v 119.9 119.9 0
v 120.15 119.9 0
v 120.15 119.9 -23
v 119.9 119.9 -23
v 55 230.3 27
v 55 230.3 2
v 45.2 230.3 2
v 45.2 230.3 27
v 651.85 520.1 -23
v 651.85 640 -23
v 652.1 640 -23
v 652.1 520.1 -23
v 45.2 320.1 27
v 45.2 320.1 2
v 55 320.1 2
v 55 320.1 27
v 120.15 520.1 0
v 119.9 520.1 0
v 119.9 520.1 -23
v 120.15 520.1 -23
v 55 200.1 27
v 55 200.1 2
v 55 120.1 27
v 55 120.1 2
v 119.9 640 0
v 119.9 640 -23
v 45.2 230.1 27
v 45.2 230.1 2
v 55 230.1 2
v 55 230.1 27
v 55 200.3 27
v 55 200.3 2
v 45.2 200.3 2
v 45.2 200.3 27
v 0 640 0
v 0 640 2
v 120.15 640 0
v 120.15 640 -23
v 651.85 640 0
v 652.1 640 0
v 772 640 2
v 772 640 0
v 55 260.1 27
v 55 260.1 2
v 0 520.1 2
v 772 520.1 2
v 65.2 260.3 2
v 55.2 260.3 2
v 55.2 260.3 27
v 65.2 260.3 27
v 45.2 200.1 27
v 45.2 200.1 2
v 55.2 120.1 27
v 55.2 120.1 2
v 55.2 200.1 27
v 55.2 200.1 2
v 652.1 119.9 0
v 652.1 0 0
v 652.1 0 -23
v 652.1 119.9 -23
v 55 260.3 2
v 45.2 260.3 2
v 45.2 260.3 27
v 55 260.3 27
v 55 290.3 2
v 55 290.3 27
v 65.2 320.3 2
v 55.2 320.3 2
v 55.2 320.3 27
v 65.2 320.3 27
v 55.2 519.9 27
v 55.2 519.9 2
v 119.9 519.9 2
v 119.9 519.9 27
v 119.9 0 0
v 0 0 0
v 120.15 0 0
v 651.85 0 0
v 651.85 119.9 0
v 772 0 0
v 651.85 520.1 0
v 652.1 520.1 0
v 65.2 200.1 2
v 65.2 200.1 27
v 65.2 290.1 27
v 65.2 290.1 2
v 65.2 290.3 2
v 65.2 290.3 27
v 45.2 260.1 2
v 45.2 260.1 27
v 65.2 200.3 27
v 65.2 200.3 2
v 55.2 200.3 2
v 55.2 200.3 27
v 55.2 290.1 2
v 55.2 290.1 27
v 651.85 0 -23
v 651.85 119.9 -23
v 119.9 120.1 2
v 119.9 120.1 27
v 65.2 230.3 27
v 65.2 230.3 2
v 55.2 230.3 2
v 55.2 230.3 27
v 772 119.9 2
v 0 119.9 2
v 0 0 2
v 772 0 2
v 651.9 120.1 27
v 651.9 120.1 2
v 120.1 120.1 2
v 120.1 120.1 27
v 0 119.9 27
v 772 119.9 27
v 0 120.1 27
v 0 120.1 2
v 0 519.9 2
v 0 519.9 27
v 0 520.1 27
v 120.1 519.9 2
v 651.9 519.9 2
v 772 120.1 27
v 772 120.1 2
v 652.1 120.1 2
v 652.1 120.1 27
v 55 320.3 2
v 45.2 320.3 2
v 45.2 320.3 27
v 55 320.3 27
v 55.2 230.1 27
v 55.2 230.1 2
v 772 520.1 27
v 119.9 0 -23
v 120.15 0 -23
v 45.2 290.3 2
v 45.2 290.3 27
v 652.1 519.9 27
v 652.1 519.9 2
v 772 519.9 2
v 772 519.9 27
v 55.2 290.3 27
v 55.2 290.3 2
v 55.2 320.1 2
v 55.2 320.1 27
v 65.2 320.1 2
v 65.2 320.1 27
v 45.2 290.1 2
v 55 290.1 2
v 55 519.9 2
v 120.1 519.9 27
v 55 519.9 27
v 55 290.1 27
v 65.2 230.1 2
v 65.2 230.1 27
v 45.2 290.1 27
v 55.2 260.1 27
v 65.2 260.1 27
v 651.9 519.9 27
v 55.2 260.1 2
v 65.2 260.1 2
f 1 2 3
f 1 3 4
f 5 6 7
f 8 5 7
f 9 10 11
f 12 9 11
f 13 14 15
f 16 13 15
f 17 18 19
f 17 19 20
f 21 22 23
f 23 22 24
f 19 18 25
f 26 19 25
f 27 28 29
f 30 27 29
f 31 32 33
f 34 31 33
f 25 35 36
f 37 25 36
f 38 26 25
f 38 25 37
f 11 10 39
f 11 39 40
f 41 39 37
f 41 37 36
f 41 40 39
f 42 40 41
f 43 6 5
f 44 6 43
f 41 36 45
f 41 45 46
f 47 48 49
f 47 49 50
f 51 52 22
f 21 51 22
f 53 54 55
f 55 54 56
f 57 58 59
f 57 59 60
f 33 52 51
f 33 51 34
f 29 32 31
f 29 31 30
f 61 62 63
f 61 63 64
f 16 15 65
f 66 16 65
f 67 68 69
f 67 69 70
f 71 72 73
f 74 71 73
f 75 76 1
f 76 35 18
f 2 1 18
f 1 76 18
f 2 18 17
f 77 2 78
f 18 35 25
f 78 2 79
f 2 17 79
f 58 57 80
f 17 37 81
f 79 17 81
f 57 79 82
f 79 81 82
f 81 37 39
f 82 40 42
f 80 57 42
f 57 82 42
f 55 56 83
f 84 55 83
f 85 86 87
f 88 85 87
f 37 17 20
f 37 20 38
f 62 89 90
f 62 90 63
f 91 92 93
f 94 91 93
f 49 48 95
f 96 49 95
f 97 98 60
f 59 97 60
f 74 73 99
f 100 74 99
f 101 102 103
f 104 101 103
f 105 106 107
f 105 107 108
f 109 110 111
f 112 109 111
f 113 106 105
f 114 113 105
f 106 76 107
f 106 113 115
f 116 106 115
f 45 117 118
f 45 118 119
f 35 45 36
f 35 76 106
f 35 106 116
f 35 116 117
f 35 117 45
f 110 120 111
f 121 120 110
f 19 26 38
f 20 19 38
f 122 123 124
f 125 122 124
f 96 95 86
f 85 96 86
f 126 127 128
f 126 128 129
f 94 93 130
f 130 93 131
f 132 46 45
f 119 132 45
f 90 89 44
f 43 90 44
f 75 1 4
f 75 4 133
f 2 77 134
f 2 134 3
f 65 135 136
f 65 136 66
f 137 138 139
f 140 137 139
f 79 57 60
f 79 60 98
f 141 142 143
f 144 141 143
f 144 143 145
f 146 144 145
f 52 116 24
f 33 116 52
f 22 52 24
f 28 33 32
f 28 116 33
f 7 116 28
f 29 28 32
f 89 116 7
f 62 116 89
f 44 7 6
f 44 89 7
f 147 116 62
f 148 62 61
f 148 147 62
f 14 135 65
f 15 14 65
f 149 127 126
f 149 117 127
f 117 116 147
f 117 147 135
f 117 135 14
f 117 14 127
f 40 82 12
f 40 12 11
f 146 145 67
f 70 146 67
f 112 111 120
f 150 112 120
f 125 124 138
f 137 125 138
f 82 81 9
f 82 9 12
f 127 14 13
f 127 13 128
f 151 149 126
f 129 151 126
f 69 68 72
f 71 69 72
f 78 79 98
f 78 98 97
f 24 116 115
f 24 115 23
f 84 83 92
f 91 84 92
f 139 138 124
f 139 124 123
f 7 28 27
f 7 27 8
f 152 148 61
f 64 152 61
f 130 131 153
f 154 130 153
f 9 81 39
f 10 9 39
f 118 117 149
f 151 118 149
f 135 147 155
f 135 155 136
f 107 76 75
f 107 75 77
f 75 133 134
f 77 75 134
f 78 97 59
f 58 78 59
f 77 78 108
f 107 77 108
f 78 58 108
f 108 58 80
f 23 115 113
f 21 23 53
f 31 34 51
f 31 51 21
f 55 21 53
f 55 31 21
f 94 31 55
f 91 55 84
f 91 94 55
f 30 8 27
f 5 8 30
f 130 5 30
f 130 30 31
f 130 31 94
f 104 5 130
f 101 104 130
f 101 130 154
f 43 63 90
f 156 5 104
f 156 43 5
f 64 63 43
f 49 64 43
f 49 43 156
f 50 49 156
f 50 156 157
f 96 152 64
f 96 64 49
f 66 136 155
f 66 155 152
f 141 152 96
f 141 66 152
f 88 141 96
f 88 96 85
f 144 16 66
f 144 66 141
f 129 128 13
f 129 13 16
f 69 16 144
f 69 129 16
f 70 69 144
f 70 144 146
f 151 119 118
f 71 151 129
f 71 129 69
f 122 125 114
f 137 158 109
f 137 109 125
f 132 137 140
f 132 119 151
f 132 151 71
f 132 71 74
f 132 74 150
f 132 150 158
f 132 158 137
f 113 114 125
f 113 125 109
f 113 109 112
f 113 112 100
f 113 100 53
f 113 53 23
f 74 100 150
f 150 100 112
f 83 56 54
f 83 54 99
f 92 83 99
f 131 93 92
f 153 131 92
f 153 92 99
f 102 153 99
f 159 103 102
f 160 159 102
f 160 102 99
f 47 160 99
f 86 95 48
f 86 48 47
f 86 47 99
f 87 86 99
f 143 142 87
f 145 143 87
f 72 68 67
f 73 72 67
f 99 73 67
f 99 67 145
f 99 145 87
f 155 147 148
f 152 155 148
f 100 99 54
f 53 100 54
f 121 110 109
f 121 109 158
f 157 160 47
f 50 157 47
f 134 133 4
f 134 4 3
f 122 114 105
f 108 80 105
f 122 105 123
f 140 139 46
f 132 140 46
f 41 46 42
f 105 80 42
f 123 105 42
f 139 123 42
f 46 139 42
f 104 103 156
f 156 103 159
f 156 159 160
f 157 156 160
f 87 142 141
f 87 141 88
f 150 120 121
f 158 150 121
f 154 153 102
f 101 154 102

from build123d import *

# Parameters (mm, degrees)
F0_W     = 772
F0_H     = 640
F1_DEPTH = 2
F2_W     = 0.25
F2_H     = 119.9
F3_DEPTH = 25
F4_DEPTH = 25
F2_W_2   = 119.9
F2_H_2   = 0.2
F2_W_3   = 0.2
F2_H_3   = 399.8
F5_DEPTH = 25
F2_W_4   = 64.7
F6_DEPTH = 25
F2_W_5   = 55
F7_DEPTH = 25
F2_H_4   = 49.5626640439
F8_DEPTH = 25
F2_H_5   = 199.6
F2_W_6   = 9.8
F2_H_6   = 30.4373359561
F2_W_7   = 10
F2_H_7   = 29.8
F9_DEPTH = 25


# Not quite as in the source:
# - a feature names something its author has since deleted; it is built from what else it names


with BuildPart() as f1:
    # F0 (on Top) → F1 (new body)
    with BuildSketch(Plane.XY):
        with Locations((386, 320)):
            Rectangle(F0_W, F0_H)
    extrude(amount=F1_DEPTH)

    # F2 (on face) → F3 (join)
    with BuildSketch(Plane.XY.offset(2)):
        with Locations((651.975, 580.05)):
            Rectangle(F2_W, F2_H)
        with Locations((120.025, 580.05)):
            Rectangle(F2_W, F2_H)
        Polygon((120.1, 119.9), (119.9, 119.9), (119.9, 0), (120.15, 0), (120.15, 119.9), align=None)
        Polygon((652.1, 119.9), (651.9, 119.9), (651.85, 119.9), (651.85, 0), (652.1, 0), align=None)
    extrude(amount=-F3_DEPTH)

    # F2 (on face) → F4 (join)
    with BuildSketch(Plane.XY.offset(2)):
        Polygon((119.9, 520.1), (0, 520.1), (0, 519.9), (55, 519.9), (55.2, 519.9), (119.9, 519.9), align=None)
        Polygon((651.85, 520.1), (120.15, 520.1), (120.15, 519.9), (651.9, 519.9), (652.1, 519.9), (652.1, 520.1), align=None)
    extrude(amount=F4_DEPTH)

    # F2 (on face) → F5 (join)
    with BuildSketch(Plane.XY.offset(2)):
        with Locations((712.05, 520)):
            Rectangle(F2_W_2, F2_H_2)
        with Locations((652, 320)):
            Rectangle(F2_W_3, F2_H_3)
    extrude(amount=F5_DEPTH)

    # F2 (on face) → F6 (join)
    with BuildSketch(Plane.XY.offset(2)):
        with Locations((712.05, 120)):
            Rectangle(F2_W_2, F2_H_2)
        Polygon((651.9, 120.1), (120.1, 120.1), (120.1, 119.9), (120.15, 119.9), (651.85, 119.9), (651.9, 119.9), align=None)
        with Locations((652, 120)):
            Rectangle(F2_W_3, F2_H_2)
        with Locations((87.55, 120)):
            Rectangle(F2_W_4, F2_H_2)
        with Locations((120, 120)):
            Rectangle(F2_W_3, F2_H_2)
    extrude(amount=F6_DEPTH)

    # F2 (on face) → F7 (join)
    with BuildSketch(Plane.XY.offset(2)):
        with Locations((27.5, 120)):
            Rectangle(F2_W_5, F2_H_2)
    extrude(amount=F7_DEPTH)

    # F2 (on face) → F8 (join)
    with BuildSketch(Plane.XY.offset(2)):
        with Locations((55.1, 175.318667978)):
            Rectangle(F2_W_3, F2_H_4)
    extrude(amount=F8_DEPTH)

    # F2 (on face) → F9 (join)
    with BuildSketch(Plane.XY.offset(2)):
        Polygon((120.15, 520.1), (119.9, 520.1), (119.9, 519.9), (120.1, 519.9), (120.15, 519.9), align=None)
        with Locations((120, 320)):
            Rectangle(F2_W_3, F2_H_3)
        with Locations((55.1, 420.1)):
            Rectangle(F2_W_3, F2_H_5)
        with Locations((55.1, 320.2)):
            Rectangle(F2_W_3, F2_H_2)
        with Locations((50.1, 320.2)):
            Rectangle(F2_W_6, F2_H_2)
        with Locations((55.1, 135.318667978)):
            Rectangle(F2_W_3, F2_H_6)
        with Locations((55.1, 120)):
            Rectangle(F2_W_3, F2_H_2)
        with Locations((60.2, 320.2)):
            Rectangle(F2_W_7, F2_H_2)
        with Locations((55.1, 305.2)):
            Rectangle(F2_W_3, F2_H_7)
        with Locations((55.1, 175.318667978)):
            Rectangle(F2_W_3, F2_H_4)
        with Locations((55.1, 290.2)):
            Rectangle(F2_W_3, F2_H_2)
        with Locations((50.1, 290.2)):
            Rectangle(F2_W_6, F2_H_2)
        with Locations((50.1, 200.2)):
            Rectangle(F2_W_6, F2_H_2)
        with Locations((55.1, 200.2)):
            Rectangle(F2_W_3, F2_H_2)
        with Locations((60.2, 290.2)):
            Rectangle(F2_W_7, F2_H_2)
        with Locations((60.2, 200.2)):
            Rectangle(F2_W_7, F2_H_2)
        with Locations((55.1, 275.2)):
            Rectangle(F2_W_3, F2_H_7)
        with Locations((55.1, 215.2)):
            Rectangle(F2_W_3, F2_H_7)
        with Locations((55.1, 260.2)):
            Rectangle(F2_W_3, F2_H_2)
        with Locations((50.1, 260.2)):
            Rectangle(F2_W_6, F2_H_2)
        with Locations((50.1, 230.2)):
            Rectangle(F2_W_6, F2_H_2)
        with Locations((55.1, 230.2)):
            Rectangle(F2_W_3, F2_H_2)
        with Locations((60.2, 260.2)):
            Rectangle(F2_W_7, F2_H_2)
        with Locations((60.2, 230.2)):
            Rectangle(F2_W_7, F2_H_2)
        with Locations((55.1, 245.2)):
            Rectangle(F2_W_3, F2_H_7)
    extrude(amount=F9_DEPTH)


solid = f1.part
